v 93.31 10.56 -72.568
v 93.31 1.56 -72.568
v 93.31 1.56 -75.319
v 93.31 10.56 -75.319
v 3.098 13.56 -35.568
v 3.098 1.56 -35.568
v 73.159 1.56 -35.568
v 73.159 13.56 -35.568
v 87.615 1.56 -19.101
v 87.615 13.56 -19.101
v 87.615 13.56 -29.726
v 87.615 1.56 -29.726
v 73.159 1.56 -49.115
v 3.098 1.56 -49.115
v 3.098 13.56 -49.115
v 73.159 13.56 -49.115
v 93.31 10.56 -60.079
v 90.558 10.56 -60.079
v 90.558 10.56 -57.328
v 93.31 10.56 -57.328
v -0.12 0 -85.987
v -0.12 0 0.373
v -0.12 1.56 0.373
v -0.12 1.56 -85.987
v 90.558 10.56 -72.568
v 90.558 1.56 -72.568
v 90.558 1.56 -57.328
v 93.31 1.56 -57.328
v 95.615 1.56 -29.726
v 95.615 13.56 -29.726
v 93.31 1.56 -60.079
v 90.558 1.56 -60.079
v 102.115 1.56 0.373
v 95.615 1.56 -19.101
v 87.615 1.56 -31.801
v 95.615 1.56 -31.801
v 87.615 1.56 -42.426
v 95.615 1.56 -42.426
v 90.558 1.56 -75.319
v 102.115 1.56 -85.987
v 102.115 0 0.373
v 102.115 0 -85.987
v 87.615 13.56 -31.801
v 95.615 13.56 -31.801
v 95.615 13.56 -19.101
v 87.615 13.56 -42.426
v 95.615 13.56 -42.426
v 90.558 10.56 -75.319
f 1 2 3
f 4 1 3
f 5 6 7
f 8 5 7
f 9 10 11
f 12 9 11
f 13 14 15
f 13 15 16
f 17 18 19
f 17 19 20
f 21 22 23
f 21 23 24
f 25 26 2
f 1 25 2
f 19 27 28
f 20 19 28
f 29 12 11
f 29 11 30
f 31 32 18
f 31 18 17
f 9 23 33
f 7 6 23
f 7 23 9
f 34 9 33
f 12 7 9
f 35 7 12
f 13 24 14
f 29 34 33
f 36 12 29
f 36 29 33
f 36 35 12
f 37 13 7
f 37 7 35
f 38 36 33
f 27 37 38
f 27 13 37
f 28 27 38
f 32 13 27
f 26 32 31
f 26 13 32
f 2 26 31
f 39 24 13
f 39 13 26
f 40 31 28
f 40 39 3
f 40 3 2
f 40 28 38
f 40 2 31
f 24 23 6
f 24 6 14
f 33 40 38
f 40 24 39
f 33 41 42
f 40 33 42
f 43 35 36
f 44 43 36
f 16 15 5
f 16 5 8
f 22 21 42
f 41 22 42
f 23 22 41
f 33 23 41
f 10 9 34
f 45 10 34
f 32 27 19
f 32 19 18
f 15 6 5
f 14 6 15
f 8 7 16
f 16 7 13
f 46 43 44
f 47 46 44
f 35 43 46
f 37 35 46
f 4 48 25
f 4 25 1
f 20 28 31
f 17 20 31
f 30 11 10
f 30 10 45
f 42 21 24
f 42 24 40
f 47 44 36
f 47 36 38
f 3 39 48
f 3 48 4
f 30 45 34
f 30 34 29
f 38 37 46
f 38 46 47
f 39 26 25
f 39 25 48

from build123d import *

# Parameters (mm, degrees)
SKETCH3_W           = 102.235
SKETCH3_H           = 86.36
BOSS_EXTRUDE1_DEPTH = 1.56
SKETCH4_W           = 70.061666
SKETCH4_H           = 13.546666
BOSS_EXTRUDE2_DEPTH = 12
SKETCH5_W           = 8
SKETCH5_H           = 10.625667
BOSS_EXTRUDE3_DEPTH = 12
SKETCH6_W           = 2.751667
SKETCH6_H           = 2.751667
BOSS_EXTRUDE4_DEPTH = 9


with BuildPart() as part:
    # Sketch3 → Boss-Extrude1 (new body)
    with BuildSketch(Plane(origin=(0, 0, 0), x_dir=(1, 0, 0), z_dir=(0, 1, 0))):
        with Locations((50.997852632, 42.807288421)):
            Rectangle(SKETCH3_W, SKETCH3_H)
    extrude(amount=BOSS_EXTRUDE1_DEPTH)

    # Sketch4 → Boss-Extrude2 (add)
    with BuildSketch(Plane(origin=(0, 1.56, 0), x_dir=(1, 0, 0), z_dir=(0, 1, 0))):
        with Locations((38.128519632, 42.341621421)):
            Rectangle(SKETCH4_W, SKETCH4_H)
    extrude(amount=BOSS_EXTRUDE2_DEPTH)

    # Sketch5 → Boss-Extrude3 (add)
    with BuildSketch(Plane(origin=(0, 1.56, 0), x_dir=(1, 0, 0), z_dir=(0, 1, 0))):
        with Locations((91.615352632, 37.113454921)):
            Rectangle(SKETCH5_W, SKETCH5_H)
        with Locations((91.615352632, 24.413454921)):
            Rectangle(SKETCH5_W, SKETCH5_H)
    extrude(amount=BOSS_EXTRUDE3_DEPTH)

    # Sketch6 → Boss-Extrude4 (add)
    with BuildSketch(Plane(origin=(0, 1.56, 0), x_dir=(1, 0, 0), z_dir=(0, 1, 0))):
        with Locations((91.934186132, 58.703454921)):
            Rectangle(SKETCH6_W, SKETCH6_H)
        with Locations((91.934186132, 73.943454921)):
            Rectangle(SKETCH6_W, SKETCH6_H)
    extrude(amount=BOSS_EXTRUDE4_DEPTH)


solid = part.part
